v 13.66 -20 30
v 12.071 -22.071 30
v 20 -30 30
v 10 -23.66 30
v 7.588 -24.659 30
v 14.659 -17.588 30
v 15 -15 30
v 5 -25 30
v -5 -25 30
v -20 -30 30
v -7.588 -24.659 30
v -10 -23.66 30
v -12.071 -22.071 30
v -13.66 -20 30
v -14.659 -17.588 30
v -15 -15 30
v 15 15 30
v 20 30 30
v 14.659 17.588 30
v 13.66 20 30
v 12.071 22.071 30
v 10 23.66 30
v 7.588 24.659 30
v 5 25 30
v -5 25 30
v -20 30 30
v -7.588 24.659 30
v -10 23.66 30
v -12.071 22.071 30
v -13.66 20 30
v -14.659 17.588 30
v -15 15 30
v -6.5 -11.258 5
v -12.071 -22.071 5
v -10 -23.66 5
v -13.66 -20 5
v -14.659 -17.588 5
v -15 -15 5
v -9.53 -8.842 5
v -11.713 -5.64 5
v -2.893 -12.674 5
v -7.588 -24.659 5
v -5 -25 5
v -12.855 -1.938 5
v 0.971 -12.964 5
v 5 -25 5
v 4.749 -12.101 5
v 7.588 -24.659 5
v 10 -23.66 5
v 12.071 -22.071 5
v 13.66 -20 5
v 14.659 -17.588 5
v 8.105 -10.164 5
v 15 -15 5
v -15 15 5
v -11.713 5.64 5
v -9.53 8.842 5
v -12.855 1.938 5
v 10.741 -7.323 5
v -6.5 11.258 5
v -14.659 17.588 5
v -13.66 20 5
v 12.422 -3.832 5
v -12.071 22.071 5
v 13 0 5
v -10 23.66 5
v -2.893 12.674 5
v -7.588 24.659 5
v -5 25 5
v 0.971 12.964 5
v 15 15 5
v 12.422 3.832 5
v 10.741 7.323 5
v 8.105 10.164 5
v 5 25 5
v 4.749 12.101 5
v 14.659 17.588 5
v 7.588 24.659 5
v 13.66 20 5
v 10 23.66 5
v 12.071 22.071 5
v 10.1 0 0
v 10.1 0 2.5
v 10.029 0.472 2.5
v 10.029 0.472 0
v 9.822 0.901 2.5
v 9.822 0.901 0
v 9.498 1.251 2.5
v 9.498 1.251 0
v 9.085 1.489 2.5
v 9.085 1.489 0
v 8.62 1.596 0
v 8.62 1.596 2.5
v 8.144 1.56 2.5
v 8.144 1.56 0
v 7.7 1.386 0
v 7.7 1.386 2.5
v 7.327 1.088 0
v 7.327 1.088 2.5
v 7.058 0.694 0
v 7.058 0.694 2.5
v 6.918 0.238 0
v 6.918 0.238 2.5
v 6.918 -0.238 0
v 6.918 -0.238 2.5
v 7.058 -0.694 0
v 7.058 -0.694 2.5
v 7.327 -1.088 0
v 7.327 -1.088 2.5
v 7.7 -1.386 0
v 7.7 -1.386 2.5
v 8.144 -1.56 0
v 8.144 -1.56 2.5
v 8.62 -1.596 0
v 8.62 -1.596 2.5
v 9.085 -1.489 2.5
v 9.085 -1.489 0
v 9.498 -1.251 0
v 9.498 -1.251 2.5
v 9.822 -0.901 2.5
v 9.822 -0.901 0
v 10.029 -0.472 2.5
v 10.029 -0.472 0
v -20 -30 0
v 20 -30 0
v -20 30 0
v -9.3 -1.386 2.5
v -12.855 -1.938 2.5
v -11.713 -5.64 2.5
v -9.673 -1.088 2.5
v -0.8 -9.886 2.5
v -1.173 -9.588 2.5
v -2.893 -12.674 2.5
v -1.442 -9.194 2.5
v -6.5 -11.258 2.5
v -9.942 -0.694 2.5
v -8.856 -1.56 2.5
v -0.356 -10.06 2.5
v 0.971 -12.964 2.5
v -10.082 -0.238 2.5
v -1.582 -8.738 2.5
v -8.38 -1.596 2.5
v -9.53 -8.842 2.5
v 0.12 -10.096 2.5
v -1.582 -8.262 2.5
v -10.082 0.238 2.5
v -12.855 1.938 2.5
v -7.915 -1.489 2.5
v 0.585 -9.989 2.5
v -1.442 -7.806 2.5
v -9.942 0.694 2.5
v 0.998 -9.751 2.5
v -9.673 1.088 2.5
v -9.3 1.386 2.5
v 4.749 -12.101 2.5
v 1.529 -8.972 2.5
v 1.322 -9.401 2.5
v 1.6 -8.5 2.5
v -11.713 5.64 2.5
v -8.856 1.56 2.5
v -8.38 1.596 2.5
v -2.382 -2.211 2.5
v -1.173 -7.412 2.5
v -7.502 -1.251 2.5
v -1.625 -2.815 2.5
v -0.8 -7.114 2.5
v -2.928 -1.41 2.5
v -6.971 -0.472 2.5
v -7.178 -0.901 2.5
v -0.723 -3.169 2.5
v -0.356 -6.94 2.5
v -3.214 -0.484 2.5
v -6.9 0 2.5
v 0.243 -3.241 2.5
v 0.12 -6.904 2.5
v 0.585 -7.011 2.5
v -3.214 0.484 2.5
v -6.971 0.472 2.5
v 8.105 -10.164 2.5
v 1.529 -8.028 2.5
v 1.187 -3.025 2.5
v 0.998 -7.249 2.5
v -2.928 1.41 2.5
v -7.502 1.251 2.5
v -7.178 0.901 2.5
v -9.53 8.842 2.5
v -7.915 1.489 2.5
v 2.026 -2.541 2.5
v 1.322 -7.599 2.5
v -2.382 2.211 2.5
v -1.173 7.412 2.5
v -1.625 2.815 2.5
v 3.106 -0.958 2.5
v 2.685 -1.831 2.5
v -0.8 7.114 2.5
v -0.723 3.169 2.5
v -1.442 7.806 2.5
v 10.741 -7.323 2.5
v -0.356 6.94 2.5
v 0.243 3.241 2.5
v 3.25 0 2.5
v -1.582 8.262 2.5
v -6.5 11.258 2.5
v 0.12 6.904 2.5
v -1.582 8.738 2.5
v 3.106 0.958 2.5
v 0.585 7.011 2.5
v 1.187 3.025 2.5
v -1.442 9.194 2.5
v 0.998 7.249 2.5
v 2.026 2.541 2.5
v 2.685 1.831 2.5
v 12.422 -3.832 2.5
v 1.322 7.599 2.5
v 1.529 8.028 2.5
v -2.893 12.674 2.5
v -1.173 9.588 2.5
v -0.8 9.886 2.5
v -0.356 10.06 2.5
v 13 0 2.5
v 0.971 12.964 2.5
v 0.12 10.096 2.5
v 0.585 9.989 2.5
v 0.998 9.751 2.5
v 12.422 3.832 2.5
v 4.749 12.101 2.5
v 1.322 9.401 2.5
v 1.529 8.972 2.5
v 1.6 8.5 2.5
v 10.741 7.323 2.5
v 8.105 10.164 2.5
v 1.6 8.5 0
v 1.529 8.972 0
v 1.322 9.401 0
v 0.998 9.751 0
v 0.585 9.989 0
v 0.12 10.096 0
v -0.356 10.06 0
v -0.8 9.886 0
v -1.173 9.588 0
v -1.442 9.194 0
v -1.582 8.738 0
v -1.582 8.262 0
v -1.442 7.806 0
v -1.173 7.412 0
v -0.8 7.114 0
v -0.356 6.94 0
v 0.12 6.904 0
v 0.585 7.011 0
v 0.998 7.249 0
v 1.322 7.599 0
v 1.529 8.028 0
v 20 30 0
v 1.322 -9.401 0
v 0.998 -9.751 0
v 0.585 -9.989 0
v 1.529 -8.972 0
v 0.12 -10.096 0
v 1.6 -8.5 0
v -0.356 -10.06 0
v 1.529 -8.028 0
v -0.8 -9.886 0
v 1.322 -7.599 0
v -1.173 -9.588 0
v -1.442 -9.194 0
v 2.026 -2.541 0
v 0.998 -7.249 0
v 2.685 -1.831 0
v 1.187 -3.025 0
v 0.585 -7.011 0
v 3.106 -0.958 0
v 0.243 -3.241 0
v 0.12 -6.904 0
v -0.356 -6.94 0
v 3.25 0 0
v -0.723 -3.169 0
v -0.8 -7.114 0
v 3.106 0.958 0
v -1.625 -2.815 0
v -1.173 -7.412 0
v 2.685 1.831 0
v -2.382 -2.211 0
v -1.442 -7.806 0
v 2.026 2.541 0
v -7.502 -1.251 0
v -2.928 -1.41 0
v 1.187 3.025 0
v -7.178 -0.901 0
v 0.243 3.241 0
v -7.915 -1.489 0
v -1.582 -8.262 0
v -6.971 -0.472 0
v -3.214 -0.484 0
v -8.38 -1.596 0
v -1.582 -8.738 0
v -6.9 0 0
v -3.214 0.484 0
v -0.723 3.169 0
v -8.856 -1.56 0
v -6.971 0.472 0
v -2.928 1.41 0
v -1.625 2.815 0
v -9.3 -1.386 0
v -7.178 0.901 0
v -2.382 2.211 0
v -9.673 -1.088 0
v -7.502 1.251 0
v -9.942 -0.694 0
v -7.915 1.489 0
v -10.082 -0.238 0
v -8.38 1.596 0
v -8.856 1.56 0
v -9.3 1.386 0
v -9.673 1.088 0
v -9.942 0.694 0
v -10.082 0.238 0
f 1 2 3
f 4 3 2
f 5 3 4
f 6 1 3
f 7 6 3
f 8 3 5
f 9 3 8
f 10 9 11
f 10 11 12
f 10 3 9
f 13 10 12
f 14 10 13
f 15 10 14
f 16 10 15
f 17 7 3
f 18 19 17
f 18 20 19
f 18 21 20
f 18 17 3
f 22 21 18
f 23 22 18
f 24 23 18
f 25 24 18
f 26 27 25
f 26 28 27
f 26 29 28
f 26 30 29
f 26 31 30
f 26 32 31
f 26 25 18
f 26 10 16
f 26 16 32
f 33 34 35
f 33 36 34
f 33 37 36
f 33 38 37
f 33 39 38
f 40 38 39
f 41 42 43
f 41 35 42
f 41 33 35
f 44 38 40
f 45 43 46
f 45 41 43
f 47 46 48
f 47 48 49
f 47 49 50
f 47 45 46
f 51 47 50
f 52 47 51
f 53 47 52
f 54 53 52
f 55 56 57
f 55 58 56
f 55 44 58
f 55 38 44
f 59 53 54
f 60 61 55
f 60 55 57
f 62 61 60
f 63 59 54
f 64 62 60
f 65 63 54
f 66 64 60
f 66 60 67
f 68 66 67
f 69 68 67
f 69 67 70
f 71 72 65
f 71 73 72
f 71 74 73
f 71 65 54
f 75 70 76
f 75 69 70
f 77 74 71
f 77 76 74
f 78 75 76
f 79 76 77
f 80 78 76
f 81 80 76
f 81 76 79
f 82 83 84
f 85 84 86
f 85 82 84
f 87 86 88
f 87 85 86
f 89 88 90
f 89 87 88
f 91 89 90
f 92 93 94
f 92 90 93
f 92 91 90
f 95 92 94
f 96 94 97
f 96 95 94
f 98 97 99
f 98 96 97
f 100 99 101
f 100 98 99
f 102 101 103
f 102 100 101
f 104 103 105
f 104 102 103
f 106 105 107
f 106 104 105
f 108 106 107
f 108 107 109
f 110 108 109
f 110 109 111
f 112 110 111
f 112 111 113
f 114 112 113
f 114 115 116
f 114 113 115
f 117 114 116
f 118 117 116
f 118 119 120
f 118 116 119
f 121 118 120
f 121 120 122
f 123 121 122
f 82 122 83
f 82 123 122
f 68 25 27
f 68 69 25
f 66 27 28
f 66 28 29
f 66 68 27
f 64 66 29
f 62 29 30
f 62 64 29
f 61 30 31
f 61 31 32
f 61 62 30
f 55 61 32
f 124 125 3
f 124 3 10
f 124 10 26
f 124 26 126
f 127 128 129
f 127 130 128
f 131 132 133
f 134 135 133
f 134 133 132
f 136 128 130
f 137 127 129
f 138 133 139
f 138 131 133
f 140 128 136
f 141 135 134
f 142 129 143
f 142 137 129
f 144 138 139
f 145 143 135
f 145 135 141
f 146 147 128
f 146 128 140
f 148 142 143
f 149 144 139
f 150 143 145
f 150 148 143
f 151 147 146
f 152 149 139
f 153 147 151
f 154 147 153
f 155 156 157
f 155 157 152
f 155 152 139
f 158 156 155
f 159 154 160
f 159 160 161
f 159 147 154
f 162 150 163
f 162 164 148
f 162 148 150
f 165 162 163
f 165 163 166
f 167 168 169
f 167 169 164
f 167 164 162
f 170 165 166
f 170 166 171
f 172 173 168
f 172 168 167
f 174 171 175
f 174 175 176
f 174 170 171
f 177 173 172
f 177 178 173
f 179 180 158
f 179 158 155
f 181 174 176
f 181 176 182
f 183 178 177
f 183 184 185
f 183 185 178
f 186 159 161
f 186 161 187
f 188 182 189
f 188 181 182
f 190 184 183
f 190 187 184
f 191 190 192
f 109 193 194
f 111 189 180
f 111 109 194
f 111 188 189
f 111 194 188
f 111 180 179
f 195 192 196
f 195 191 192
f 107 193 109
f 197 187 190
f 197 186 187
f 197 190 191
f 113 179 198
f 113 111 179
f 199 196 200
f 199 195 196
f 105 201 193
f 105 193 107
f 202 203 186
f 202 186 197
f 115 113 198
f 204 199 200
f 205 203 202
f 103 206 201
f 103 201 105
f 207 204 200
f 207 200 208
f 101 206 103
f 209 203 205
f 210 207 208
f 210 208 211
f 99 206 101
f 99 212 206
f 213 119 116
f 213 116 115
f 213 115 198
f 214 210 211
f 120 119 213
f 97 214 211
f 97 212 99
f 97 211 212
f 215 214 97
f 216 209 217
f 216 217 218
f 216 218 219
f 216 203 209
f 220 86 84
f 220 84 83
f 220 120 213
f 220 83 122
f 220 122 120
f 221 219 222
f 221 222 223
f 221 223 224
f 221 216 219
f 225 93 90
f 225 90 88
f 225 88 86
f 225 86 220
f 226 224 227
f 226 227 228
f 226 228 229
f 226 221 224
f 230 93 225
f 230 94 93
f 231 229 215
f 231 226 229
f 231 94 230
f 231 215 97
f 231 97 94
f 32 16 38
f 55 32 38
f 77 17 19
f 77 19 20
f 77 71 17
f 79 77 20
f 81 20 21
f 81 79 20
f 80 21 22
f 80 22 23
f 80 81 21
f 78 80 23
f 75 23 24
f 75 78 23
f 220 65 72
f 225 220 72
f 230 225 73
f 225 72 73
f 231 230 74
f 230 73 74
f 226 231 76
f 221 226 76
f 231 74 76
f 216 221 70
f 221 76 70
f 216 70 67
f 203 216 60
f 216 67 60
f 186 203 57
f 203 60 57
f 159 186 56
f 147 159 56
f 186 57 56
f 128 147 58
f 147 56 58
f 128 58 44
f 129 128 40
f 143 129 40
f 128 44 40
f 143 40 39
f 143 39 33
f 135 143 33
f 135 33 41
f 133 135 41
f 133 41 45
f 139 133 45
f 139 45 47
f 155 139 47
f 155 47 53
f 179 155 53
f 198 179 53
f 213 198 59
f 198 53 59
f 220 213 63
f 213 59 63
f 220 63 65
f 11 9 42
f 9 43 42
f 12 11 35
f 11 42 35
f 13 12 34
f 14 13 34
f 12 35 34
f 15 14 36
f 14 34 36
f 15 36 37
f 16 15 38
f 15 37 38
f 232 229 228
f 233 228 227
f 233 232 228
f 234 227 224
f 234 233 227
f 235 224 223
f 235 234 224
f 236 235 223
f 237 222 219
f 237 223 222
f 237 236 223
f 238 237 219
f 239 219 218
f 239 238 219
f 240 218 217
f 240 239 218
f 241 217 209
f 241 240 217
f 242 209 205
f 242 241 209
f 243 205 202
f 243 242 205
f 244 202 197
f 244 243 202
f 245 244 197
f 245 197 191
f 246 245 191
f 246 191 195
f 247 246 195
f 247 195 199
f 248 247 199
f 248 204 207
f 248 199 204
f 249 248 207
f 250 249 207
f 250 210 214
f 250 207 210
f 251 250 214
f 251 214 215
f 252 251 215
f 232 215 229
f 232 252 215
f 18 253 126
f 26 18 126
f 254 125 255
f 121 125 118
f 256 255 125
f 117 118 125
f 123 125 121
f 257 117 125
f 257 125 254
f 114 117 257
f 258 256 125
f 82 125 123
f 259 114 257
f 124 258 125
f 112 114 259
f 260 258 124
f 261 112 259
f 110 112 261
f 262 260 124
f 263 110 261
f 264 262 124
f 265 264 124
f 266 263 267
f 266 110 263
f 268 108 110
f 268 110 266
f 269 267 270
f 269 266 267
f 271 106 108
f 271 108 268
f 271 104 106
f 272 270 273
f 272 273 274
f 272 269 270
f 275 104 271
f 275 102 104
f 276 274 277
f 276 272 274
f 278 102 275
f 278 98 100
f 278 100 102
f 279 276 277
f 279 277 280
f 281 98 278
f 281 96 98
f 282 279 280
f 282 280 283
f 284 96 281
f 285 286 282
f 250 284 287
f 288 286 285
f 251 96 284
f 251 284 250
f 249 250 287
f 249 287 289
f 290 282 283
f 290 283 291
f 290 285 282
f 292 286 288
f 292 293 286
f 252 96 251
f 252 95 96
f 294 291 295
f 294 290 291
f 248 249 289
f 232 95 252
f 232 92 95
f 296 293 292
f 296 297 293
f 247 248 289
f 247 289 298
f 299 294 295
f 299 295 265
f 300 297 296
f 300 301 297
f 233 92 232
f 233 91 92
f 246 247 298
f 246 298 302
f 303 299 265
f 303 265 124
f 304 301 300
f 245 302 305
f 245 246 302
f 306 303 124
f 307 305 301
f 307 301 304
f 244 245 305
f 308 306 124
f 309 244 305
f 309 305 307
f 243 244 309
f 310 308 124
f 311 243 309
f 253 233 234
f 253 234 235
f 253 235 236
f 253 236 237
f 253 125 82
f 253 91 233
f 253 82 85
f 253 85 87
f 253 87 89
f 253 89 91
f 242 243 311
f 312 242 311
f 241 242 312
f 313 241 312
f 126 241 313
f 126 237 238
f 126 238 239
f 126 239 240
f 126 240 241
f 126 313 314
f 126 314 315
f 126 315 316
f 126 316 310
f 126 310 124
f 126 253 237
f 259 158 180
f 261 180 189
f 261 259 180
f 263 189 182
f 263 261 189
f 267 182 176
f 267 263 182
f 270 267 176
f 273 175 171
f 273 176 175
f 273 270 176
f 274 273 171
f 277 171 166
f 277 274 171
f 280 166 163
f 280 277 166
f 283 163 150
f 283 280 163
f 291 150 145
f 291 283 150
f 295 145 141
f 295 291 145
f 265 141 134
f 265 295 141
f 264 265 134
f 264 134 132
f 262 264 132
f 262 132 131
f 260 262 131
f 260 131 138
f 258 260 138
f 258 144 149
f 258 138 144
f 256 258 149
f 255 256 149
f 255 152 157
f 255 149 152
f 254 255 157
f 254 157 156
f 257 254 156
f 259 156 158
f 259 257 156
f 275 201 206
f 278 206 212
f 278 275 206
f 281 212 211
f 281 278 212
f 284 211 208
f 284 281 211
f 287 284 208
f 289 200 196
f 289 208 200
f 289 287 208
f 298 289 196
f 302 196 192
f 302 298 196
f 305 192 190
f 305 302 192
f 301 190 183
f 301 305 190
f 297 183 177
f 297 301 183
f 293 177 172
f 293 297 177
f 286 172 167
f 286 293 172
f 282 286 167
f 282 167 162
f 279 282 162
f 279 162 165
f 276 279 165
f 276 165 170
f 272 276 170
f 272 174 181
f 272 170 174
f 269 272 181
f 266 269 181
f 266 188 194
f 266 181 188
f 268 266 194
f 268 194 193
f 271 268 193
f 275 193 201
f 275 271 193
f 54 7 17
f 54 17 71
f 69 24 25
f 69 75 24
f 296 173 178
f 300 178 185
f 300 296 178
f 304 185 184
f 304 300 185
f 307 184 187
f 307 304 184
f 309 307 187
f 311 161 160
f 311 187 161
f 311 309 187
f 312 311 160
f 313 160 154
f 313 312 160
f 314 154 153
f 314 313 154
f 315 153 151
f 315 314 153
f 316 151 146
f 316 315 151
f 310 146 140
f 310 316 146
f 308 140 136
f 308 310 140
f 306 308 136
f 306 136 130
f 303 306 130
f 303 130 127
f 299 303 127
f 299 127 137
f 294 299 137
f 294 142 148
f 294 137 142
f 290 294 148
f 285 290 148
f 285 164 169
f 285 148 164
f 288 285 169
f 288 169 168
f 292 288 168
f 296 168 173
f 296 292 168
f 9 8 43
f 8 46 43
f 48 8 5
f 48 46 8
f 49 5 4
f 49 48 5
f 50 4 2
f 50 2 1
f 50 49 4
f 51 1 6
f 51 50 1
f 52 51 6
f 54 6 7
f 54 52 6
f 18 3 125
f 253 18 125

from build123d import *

# Parameters (mm, degrees)
SKETCH_1_W          = 40
SKETCH_1_H          = 50
SKETCH_1_R          = 1.6
SKETCH_1_R_2        = 3.25
EXTRUDE_1_DEPTH     = 5
SKETCH_2_R          = 13
CUT_EXTRUDE_1_DEPTH = 2.5
SKETCH_3_W          = 40
SKETCH_3_H          = 5
EXTRUDE_2_DEPTH     = 30
SKETCH_4_W          = 25
SKETCH_4_H          = 50
EXTRUDE_3_DEPTH     = 5
FILLET_1_R          = 10


with BuildPart() as part:
    # ｽｹｯﾁ1 → ﾎﾞｽ - 押し出し1 (new body)
    with BuildSketch(Plane.XY):
        Rectangle(SKETCH_1_W, SKETCH_1_H)
        with Locations((0, 8.5)):
            Circle(SKETCH_1_R, mode=Mode.SUBTRACT)
        with Locations((8.5, 0)):
            Circle(SKETCH_1_R, mode=Mode.SUBTRACT)
        with Locations((0, -8.5)):
            Circle(SKETCH_1_R, mode=Mode.SUBTRACT)
        with Locations((-8.5, 0)):
            Circle(SKETCH_1_R, mode=Mode.SUBTRACT)
        Circle(SKETCH_1_R_2, mode=Mode.SUBTRACT)
    extrude(amount=EXTRUDE_1_DEPTH)

    # ｽｹｯﾁ2 → ｶｯﾄ - 押し出し1 (cut)
    with BuildSketch(Plane.XY.offset(5)):
        Circle(SKETCH_2_R)
    extrude(amount=-CUT_EXTRUDE_1_DEPTH, mode=Mode.SUBTRACT)

    # ｽｹｯﾁ3 → ﾎﾞｽ - 押し出し2 (add)
    with BuildSketch(Plane(origin=(0, 0, 0), x_dir=(-1, 0, 0), z_dir=(0, 0, -1))):
        with Locations((0, 27.5)):
            Rectangle(SKETCH_3_W, SKETCH_3_H)
        with Locations((0, -27.5)):
            Rectangle(SKETCH_3_W, SKETCH_3_H)
    extrude(amount=-EXTRUDE_2_DEPTH)

    # ｽｹｯﾁ4 → ﾎﾞｽ - 押し出し3 (add)
    with BuildSketch(Plane(origin=(20, 0, 0), x_dir=(0, 0, -1), z_dir=(1, 0, 0))):
        with Locations((-17.5, 0)):
            Rectangle(SKETCH_4_W, SKETCH_4_H)
    extrude_3 = extrude(amount=-EXTRUDE_3_DEPTH)

    # ﾐﾗｰ1: ﾎﾞｽ - 押し出し3 across plane
    add(extrude_3.mirror(Plane(origin=(0, 0, 0), x_dir=(0, 0, 1), z_dir=(1, 0, 0))))

    # ﾌｨﾚｯﾄ1
    fillet_1_edges = [part.edges().sort_by_distance(p)[0] for p in [
        (15, -25, 17.5),
        (15, 25, 17.5),
        (-15, 25, 17.5),
        (-15, -25, 17.5),
    ]]
    fillet(fillet_1_edges, radius=FILLET_1_R)


solid = part.part
